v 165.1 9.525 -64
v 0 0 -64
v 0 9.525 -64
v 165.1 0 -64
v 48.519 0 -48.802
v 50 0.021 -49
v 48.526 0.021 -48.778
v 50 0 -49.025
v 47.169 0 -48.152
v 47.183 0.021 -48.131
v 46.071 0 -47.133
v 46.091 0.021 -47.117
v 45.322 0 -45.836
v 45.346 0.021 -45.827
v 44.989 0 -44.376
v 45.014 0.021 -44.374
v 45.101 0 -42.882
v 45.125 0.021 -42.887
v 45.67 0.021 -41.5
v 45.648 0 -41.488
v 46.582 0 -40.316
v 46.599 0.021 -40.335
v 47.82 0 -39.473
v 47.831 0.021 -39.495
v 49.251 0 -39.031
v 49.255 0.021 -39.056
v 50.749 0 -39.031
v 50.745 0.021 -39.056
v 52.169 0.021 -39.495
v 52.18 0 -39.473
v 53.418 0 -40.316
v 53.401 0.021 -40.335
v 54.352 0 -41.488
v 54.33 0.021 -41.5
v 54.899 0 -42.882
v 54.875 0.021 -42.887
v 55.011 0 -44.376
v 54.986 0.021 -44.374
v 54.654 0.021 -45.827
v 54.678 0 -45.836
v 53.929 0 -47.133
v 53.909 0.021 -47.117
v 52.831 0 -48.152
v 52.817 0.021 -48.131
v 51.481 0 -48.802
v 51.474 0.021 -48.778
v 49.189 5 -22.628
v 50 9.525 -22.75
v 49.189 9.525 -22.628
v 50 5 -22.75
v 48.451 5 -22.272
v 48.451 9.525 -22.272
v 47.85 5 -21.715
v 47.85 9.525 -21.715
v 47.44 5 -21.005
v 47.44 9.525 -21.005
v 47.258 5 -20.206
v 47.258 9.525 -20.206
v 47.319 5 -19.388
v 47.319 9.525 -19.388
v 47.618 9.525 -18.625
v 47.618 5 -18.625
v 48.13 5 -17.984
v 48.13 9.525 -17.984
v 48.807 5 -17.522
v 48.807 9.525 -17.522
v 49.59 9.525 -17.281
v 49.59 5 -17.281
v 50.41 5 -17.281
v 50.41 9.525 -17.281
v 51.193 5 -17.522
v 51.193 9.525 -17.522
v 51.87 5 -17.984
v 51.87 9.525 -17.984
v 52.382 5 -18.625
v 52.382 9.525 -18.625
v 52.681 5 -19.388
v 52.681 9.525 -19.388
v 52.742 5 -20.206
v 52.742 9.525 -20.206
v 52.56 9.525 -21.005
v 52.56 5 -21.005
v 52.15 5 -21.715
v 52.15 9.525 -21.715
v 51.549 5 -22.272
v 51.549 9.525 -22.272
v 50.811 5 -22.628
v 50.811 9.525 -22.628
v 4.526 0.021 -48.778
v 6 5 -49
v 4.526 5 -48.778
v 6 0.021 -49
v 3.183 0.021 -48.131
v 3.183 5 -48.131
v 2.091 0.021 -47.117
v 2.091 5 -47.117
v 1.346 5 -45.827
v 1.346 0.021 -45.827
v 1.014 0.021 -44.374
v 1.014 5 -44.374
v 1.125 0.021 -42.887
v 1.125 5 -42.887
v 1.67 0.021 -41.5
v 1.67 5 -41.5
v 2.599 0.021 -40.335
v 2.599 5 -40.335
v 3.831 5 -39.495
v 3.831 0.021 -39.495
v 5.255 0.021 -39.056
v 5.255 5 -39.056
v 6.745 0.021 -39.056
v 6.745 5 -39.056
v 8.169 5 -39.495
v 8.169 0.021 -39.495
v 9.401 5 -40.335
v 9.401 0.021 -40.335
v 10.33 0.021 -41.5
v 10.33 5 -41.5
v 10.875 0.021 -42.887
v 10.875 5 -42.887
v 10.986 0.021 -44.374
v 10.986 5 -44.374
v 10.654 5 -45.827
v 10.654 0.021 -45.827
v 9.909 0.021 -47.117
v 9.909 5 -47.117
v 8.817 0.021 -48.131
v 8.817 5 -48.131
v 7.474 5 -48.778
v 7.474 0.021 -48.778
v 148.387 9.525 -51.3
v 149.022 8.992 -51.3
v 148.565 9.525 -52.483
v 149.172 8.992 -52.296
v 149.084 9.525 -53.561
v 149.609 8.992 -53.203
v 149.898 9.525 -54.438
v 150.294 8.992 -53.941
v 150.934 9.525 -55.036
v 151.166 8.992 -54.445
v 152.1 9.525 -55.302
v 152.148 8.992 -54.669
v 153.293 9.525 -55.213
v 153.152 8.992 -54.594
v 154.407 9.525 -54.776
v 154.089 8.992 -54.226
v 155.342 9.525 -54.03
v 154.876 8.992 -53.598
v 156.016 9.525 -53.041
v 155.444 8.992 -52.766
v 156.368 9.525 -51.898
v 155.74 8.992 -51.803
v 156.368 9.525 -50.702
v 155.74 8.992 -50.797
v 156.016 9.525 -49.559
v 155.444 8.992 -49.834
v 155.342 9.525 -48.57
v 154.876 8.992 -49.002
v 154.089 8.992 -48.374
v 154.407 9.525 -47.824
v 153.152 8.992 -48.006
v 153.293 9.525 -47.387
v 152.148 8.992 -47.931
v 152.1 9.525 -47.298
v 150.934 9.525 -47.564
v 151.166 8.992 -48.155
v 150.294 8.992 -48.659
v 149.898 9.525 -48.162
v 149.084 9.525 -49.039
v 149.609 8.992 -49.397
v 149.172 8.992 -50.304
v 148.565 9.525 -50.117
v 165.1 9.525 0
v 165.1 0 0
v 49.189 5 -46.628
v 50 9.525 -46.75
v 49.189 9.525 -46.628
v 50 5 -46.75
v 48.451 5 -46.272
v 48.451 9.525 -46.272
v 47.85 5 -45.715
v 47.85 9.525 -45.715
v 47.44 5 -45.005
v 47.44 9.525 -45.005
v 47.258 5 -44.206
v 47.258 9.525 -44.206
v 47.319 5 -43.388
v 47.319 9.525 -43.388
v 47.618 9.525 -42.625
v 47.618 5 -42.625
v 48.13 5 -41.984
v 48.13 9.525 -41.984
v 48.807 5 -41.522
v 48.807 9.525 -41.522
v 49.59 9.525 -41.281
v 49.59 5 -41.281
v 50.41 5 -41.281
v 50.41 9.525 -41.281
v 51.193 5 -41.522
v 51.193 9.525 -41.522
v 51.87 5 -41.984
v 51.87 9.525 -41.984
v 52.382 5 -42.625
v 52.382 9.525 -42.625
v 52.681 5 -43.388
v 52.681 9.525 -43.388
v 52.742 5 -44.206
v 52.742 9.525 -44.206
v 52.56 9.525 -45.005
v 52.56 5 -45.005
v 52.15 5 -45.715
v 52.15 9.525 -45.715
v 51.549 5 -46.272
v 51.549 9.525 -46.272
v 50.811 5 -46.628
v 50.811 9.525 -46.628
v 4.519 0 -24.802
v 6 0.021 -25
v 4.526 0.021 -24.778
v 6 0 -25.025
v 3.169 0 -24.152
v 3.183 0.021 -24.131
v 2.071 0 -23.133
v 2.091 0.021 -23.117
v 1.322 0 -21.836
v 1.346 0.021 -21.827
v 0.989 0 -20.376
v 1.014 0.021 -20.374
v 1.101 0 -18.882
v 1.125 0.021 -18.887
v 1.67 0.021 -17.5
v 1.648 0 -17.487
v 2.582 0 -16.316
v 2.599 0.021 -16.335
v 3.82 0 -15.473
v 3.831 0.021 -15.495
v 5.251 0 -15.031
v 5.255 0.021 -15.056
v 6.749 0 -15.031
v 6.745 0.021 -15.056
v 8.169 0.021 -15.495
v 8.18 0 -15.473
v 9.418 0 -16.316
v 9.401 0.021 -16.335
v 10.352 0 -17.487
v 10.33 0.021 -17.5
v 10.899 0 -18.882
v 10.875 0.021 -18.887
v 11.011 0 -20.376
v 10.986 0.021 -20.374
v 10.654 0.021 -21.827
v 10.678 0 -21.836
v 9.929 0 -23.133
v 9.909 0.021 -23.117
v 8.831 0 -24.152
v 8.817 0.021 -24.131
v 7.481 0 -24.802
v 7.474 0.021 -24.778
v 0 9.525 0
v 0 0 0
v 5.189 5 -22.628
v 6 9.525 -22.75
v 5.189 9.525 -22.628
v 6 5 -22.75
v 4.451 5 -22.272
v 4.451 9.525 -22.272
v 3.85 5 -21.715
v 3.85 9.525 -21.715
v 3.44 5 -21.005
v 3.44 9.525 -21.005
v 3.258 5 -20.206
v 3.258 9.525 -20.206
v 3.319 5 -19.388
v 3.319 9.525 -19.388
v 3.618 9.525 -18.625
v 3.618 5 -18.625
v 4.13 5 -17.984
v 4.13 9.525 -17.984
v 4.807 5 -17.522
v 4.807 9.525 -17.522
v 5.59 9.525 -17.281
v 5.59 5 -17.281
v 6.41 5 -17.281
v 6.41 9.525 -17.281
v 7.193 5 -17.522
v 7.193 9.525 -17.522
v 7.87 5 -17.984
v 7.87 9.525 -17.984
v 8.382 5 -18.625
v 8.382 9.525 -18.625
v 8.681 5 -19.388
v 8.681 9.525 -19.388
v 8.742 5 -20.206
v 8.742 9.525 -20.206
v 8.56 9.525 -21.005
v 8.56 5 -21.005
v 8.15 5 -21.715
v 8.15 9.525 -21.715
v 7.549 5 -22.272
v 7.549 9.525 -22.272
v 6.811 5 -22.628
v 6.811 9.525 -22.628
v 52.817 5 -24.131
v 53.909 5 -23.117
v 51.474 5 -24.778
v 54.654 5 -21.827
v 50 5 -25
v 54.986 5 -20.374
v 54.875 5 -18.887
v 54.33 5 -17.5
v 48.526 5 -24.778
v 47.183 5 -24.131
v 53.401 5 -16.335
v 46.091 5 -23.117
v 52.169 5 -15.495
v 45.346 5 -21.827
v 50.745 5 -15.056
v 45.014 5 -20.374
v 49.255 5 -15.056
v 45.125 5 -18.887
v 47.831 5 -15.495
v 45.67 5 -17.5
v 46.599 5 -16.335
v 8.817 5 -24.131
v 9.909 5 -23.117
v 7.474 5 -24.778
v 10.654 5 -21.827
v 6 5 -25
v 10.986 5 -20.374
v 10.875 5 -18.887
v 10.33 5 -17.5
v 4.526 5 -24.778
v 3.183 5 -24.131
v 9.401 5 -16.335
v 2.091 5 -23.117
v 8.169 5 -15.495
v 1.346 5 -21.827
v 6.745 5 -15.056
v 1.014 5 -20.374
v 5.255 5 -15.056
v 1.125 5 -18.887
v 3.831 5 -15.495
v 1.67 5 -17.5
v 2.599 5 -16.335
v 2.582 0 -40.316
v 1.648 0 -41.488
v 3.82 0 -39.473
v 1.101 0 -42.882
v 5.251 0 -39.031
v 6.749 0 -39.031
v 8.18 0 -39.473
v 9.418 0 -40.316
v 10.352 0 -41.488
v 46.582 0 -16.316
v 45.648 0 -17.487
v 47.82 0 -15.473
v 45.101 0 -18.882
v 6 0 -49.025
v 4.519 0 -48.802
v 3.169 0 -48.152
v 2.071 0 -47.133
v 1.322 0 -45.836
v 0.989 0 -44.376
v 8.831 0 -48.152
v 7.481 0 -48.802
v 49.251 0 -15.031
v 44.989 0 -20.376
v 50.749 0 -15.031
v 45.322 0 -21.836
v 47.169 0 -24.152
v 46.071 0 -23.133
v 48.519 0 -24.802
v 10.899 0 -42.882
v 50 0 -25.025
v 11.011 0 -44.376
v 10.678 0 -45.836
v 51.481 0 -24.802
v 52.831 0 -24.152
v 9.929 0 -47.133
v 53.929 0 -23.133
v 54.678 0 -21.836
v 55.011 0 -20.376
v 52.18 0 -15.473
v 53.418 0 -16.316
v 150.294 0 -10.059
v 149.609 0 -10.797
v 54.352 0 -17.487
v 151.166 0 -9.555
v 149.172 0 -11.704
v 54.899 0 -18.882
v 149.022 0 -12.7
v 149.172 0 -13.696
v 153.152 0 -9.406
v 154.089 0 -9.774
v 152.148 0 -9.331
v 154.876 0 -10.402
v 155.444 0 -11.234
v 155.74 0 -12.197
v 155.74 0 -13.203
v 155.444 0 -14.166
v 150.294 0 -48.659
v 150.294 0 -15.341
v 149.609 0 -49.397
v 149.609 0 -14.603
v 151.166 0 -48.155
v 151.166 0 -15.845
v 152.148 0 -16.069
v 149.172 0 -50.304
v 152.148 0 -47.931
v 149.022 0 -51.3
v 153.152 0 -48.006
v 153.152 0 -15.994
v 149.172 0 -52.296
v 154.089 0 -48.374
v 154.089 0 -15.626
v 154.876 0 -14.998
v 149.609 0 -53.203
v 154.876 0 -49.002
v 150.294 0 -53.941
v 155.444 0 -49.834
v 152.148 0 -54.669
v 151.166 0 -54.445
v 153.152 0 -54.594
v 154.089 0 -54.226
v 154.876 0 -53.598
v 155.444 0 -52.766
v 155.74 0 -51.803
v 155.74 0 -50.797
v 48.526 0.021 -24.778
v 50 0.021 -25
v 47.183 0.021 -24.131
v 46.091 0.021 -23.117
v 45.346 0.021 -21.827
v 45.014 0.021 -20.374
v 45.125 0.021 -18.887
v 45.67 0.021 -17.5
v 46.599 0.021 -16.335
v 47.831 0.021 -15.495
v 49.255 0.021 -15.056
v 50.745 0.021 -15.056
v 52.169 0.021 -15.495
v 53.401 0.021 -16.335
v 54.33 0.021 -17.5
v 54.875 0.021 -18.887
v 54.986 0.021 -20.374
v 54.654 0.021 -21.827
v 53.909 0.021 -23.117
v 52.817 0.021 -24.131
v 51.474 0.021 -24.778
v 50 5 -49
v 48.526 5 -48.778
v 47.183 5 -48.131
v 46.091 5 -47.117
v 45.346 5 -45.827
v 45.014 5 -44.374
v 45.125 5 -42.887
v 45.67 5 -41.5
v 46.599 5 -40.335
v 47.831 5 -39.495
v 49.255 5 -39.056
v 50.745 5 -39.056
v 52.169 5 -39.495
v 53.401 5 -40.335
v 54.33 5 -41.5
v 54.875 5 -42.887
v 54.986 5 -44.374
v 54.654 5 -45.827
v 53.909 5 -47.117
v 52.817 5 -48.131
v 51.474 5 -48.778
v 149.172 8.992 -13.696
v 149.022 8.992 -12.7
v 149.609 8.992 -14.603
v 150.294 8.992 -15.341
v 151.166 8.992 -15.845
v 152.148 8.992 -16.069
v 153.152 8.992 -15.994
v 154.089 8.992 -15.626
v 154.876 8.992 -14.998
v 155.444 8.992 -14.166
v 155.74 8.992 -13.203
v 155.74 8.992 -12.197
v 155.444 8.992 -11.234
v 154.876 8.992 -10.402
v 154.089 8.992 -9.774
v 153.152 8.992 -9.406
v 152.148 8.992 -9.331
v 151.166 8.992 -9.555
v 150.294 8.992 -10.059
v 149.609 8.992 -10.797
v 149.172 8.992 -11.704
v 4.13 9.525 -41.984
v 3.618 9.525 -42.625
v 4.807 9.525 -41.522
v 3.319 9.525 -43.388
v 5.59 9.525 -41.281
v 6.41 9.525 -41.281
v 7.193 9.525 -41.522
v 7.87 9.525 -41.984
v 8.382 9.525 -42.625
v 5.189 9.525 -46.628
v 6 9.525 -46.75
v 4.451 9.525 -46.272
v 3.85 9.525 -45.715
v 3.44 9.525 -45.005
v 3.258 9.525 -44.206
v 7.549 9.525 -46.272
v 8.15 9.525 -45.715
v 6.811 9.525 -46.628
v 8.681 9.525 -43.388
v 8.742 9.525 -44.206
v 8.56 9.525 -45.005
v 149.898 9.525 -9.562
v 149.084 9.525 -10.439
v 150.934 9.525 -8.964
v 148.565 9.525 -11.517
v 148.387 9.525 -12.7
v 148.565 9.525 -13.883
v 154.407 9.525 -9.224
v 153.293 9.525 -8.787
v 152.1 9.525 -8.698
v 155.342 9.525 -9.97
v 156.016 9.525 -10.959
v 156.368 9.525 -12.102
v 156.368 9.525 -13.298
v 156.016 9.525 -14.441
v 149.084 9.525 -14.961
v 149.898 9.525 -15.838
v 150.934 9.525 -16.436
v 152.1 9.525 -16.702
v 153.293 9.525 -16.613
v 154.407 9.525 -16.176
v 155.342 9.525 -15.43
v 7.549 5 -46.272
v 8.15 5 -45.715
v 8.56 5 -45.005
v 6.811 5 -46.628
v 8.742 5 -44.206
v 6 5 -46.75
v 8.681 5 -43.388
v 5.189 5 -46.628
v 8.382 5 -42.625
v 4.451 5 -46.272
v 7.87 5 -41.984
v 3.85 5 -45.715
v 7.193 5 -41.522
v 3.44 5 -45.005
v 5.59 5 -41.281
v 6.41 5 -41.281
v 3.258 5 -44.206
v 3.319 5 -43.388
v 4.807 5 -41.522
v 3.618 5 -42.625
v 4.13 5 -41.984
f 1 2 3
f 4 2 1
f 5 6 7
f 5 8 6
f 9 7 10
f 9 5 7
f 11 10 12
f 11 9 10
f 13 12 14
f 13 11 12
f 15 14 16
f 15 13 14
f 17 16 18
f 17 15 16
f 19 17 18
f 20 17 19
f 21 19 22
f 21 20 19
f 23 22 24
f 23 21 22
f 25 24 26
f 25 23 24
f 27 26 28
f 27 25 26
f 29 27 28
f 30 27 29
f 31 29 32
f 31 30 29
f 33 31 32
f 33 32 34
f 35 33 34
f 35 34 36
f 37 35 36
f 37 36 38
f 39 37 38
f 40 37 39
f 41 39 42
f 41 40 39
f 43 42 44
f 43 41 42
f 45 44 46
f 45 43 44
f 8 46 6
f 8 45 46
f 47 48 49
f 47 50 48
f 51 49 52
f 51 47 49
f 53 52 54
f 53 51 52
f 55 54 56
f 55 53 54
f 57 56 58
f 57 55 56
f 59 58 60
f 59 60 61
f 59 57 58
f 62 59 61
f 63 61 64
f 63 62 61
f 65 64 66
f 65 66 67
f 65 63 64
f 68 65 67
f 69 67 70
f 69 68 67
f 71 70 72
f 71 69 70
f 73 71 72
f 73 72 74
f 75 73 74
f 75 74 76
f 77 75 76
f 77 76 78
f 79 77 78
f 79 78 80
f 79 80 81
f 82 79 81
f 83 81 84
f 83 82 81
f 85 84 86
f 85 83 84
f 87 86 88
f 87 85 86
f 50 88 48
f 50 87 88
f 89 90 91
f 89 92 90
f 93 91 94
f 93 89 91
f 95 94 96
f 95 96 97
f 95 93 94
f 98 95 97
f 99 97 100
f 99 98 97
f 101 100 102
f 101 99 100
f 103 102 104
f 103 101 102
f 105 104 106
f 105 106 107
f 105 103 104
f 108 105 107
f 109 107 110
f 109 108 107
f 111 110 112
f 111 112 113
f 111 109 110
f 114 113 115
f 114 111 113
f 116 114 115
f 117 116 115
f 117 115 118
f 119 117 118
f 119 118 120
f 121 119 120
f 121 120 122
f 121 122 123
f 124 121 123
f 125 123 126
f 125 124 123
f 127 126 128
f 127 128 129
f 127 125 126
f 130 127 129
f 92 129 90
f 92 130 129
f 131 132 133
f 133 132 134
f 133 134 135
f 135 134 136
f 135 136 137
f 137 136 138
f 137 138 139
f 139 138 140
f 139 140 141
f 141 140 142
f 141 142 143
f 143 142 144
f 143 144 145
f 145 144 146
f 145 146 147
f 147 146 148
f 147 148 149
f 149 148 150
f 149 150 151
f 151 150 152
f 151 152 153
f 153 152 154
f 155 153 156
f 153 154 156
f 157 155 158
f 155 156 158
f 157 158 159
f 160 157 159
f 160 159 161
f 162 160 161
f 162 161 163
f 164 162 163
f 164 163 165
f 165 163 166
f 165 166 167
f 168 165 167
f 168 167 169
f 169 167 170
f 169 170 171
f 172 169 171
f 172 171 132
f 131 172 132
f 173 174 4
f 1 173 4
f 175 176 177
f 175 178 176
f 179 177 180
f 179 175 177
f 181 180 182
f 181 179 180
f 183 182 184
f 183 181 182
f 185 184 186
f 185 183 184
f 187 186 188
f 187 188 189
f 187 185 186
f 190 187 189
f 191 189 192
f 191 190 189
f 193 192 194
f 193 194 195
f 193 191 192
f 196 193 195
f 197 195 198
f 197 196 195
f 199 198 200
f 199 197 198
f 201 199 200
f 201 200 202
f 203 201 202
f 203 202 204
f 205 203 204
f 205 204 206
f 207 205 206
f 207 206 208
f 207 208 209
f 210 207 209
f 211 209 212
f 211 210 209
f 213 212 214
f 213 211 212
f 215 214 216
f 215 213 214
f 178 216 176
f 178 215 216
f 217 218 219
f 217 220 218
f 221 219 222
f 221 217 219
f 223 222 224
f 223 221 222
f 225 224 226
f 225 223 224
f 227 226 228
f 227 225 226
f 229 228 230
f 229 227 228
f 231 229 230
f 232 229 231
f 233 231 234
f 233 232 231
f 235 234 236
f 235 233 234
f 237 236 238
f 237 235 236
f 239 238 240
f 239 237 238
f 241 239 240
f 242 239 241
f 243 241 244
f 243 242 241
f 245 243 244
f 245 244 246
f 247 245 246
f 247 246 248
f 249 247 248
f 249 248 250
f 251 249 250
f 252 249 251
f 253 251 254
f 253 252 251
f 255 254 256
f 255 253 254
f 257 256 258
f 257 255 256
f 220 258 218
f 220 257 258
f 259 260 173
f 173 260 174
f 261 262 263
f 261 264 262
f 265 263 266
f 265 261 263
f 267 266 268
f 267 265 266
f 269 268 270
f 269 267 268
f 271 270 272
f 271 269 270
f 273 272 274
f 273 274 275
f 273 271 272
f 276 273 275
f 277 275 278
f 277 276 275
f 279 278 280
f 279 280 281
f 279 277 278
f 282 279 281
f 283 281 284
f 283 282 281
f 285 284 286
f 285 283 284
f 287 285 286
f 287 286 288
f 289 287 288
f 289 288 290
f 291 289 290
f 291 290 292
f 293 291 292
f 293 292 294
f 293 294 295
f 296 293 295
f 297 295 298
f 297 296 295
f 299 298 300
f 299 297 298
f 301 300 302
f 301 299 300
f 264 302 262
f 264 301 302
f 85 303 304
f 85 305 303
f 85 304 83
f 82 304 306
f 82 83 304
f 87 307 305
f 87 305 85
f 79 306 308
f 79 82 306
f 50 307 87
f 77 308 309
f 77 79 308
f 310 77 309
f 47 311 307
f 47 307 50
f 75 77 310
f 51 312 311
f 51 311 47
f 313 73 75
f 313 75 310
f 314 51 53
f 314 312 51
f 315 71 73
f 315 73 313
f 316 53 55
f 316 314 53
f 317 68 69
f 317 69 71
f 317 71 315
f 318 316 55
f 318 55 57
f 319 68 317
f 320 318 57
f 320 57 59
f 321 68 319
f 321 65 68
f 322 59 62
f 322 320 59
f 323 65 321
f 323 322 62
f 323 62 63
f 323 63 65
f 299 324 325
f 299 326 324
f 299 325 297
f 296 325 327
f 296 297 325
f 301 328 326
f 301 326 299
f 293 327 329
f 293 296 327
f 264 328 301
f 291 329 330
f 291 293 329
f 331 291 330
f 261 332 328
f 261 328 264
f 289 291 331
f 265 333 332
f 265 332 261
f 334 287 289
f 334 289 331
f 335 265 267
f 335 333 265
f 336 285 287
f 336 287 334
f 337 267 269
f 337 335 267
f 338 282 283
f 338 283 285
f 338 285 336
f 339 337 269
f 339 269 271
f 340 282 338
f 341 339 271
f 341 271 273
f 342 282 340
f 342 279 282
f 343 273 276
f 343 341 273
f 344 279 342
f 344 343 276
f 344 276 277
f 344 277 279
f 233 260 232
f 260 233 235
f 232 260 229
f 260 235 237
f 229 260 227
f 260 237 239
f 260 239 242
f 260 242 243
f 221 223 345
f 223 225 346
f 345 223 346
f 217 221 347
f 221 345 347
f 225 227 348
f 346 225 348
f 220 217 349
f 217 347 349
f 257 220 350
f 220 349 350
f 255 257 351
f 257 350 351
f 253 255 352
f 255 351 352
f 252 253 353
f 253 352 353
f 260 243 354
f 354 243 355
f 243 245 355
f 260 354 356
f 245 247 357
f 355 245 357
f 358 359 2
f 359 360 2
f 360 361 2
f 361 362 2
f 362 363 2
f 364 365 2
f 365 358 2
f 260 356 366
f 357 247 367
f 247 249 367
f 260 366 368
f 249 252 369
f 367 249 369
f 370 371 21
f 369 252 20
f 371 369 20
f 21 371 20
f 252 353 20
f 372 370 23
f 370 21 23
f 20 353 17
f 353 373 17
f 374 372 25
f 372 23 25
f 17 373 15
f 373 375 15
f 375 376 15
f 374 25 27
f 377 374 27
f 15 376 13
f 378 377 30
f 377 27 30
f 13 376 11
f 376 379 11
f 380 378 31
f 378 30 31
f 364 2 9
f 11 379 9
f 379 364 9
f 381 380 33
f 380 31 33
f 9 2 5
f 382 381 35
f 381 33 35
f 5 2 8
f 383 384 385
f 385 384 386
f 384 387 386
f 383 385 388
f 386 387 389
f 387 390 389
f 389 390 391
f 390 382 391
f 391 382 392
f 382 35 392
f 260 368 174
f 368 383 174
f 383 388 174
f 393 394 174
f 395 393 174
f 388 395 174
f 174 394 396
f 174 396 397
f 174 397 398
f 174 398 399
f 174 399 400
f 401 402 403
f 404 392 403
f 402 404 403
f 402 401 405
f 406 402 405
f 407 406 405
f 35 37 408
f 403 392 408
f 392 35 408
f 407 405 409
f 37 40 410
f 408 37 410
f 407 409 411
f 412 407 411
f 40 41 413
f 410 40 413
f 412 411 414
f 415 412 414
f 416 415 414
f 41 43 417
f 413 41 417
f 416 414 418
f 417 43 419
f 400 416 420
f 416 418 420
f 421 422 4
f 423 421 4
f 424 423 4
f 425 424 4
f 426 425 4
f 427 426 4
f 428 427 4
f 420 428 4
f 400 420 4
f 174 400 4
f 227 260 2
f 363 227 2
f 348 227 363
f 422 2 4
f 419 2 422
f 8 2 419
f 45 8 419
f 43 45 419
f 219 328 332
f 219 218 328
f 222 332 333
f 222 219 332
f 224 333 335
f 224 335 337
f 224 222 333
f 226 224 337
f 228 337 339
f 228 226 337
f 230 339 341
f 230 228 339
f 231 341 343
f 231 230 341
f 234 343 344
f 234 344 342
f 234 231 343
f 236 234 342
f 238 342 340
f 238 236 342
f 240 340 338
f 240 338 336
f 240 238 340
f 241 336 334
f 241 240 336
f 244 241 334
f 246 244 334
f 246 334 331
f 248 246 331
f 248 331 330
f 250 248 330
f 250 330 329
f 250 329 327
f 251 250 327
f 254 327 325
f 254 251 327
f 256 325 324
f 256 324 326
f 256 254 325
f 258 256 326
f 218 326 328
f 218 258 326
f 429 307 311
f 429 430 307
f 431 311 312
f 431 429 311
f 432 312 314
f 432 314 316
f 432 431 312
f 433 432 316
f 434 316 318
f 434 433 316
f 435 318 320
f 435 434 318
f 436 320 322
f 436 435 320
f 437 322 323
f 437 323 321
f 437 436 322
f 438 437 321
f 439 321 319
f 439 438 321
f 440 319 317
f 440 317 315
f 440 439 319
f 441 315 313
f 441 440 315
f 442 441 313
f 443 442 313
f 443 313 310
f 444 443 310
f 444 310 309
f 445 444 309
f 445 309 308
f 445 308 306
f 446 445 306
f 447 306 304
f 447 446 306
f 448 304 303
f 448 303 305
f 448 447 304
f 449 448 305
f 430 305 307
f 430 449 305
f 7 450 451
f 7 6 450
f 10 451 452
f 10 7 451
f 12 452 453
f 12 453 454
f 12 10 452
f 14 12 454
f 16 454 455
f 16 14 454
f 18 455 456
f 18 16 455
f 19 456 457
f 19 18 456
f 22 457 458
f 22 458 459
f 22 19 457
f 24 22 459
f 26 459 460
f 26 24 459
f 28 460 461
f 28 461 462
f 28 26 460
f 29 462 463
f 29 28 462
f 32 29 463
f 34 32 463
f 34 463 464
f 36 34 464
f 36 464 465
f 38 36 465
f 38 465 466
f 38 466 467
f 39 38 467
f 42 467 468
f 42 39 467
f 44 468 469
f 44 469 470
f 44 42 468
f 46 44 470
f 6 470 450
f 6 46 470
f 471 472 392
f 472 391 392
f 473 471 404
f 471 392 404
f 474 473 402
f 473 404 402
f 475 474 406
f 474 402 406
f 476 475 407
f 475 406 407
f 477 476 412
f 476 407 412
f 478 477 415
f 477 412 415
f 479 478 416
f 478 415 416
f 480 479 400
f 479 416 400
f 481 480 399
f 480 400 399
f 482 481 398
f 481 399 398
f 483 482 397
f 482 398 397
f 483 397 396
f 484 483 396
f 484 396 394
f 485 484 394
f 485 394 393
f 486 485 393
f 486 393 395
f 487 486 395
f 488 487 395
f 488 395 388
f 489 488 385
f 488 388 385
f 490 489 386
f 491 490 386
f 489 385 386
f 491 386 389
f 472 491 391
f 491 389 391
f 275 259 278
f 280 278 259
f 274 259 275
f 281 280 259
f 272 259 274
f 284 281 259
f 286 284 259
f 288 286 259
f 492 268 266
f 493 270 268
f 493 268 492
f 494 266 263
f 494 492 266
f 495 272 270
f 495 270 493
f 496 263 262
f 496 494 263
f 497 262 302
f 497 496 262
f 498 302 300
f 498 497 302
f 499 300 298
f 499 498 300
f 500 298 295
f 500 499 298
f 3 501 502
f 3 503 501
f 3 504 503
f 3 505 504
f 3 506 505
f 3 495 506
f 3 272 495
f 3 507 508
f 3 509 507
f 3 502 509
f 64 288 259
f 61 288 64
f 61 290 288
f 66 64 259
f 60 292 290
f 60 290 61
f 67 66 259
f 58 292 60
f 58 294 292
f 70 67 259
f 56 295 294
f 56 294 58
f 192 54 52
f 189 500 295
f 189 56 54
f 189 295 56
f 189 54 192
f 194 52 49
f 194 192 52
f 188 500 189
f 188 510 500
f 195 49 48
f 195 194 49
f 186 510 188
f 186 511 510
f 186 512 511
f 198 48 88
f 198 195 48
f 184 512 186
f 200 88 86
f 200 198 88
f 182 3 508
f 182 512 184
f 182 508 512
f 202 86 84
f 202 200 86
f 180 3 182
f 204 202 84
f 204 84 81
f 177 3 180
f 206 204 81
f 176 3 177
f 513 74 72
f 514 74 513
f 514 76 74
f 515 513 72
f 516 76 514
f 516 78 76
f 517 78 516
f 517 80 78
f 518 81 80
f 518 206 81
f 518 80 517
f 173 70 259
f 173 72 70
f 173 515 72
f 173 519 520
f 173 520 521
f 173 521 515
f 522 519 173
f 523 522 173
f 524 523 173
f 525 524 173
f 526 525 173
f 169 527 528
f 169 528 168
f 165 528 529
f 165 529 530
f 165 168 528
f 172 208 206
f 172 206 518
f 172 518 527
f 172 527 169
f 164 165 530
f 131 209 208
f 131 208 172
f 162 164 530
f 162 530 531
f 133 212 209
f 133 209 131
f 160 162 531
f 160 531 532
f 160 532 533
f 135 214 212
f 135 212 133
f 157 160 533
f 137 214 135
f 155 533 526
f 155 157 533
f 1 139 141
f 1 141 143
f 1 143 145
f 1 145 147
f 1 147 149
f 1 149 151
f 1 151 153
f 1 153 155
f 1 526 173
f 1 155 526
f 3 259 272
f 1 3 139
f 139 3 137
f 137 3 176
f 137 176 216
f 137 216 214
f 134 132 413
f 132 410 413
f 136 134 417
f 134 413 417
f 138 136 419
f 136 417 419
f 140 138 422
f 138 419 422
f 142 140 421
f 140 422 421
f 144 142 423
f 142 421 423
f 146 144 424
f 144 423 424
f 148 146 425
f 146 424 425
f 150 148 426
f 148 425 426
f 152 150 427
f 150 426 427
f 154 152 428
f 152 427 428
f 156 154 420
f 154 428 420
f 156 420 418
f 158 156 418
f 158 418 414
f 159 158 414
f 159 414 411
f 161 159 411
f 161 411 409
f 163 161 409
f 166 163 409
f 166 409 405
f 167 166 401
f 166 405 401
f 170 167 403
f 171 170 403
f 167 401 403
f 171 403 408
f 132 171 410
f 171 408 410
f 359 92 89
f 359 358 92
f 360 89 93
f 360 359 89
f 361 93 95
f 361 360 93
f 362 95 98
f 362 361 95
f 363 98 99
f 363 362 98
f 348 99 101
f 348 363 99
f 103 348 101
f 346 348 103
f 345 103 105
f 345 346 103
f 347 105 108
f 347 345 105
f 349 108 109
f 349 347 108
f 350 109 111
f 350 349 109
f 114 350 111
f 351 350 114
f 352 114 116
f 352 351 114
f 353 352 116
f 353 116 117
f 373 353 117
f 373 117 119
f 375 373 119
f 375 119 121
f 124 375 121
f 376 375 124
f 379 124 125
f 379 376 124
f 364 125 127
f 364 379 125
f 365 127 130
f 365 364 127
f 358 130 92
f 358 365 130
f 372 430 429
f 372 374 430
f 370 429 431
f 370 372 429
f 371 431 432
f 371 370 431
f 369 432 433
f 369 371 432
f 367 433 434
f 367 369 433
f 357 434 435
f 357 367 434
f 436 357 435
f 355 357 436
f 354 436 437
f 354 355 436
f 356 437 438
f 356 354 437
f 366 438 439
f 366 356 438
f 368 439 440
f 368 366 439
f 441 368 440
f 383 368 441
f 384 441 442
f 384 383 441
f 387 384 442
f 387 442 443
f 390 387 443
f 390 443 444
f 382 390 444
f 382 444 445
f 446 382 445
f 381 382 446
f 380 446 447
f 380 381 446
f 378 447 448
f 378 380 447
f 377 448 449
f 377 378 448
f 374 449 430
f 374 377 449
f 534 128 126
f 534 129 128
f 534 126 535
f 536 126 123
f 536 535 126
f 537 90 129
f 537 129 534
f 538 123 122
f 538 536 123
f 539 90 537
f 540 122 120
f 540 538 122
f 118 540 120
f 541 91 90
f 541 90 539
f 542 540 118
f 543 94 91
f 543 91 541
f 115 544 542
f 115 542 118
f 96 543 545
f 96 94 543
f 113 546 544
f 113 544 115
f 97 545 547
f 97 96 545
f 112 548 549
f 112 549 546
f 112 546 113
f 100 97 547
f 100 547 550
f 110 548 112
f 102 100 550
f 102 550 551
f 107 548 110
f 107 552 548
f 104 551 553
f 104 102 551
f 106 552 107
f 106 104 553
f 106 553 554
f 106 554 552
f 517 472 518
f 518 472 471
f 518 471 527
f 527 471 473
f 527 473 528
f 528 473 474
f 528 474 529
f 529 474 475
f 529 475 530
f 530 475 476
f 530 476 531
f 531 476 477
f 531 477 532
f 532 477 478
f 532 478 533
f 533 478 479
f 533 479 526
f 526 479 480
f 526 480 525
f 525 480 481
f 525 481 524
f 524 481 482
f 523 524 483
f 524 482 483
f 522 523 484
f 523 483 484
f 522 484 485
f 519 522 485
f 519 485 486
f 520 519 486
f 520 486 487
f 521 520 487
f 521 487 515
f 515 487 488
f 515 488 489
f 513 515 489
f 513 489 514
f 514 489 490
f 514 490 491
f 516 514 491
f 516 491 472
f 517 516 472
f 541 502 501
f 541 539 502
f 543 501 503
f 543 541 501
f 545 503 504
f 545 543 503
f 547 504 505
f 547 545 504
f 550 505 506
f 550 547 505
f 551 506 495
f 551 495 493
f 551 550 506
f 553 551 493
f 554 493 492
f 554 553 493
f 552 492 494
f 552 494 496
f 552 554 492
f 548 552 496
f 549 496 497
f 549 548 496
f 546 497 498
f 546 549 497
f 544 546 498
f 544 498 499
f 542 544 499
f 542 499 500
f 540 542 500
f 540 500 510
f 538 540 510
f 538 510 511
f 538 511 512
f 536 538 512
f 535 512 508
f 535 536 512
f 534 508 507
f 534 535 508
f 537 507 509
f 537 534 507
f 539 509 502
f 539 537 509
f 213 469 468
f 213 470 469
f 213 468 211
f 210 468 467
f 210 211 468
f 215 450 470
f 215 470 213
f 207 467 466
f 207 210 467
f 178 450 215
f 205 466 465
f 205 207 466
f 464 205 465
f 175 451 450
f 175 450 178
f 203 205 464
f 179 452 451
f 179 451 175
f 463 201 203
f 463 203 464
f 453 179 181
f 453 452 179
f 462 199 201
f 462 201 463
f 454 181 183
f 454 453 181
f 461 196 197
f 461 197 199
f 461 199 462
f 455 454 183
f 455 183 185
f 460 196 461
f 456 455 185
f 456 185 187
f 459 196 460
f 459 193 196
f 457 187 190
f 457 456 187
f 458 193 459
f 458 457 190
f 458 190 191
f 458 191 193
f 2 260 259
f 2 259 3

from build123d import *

# Parameters (mm, degrees)
SKETCH1_W                         = 165.1
SKETCH1_H                         = 64
BOSS_EXTRUDE1_DEPTH               = 9.525
F_1_4_CLEARANCE_HOLE1_D           = 6.7564
F_1_4_CLEARANCE_HOLE1_CSINK_D     = 8.0264
F_1_4_CLEARANCE_HOLE1_CSINK_ANGLE = 100
CBORE_FOR_M5_SHCS1_AT_2_COUNT     = 2
CBORE_FOR_M5_SHCS1_AT_2_PITCH     = 44
CBORE_FOR_M5_SHCS1_AT_3_COUNT     = 2
CBORE_FOR_M5_SHCS1_AT_3_PITCH     = 50.119856345
CBORE_FOR_M5_SHCS1_AT_4_COUNT     = 2
CBORE_FOR_M5_SHCS1_AT_4_PITCH     = 24


with BuildPart() as part:
    # Sketch1 → Boss-Extrude1 (new body)
    with BuildSketch(Plane(origin=(0, 0, 0), x_dir=(1, 0, 0), z_dir=(0, 1, 0))):
        with Locations((82.55, 32)):
            Rectangle(SKETCH1_W, SKETCH1_H)
    extrude(amount=BOSS_EXTRUDE1_DEPTH)

    # 1/4 Clearance Hole1 (through all)
    with Locations(Plane(origin=(0, 9.525, 0), x_dir=(1, 0, 0), z_dir=(0, 1, 0))):
        with Locations((152.4, 51.3), (152.4, 12.7)):
            CounterSinkHole(F_1_4_CLEARANCE_HOLE1_D / 2, F_1_4_CLEARANCE_HOLE1_CSINK_D / 2, counter_sink_angle=F_1_4_CLEARANCE_HOLE1_CSINK_ANGLE)

    # Sketch7 → CBORE for M5 SHCS1 (revolve, cut)
    with BuildSketch(Plane(origin=(6, 0, -44), x_dir=(0, 0, -1), z_dir=(1, 0, 0))):
        Polygon((0, 0), (0, 9.525), (2.75, 9.525), (2.75, 5), (5, 5), (5, 0.020977491), (5.025, 0), align=None)
    cbore_for_m5_shcs1 = revolve(axis=Axis((6, -6.35, -44), (0, 1, 0)), mode=Mode.SUBTRACT)

    # CBORE for M5 SHCS1 at 2: CBORE for M5 SHCS1 ×2
    with Locations(*[(i * CBORE_FOR_M5_SHCS1_AT_2_PITCH, 0, 0) for i in range(1, CBORE_FOR_M5_SHCS1_AT_2_COUNT)]):
        add(cbore_for_m5_shcs1, mode=Mode.SUBTRACT)

    # CBORE for M5 SHCS1 at 3: CBORE for M5 SHCS1 ×2
    with Locations(*[Vector(0.8778955729143844, 0, 0.4788521306805733) * (i * CBORE_FOR_M5_SHCS1_AT_3_PITCH) for i in range(1, CBORE_FOR_M5_SHCS1_AT_3_COUNT)]):
        add(cbore_for_m5_shcs1, mode=Mode.SUBTRACT)

    # CBORE for M5 SHCS1 at 4: CBORE for M5 SHCS1 ×2
    with Locations(*[(0, 0, i * CBORE_FOR_M5_SHCS1_AT_4_PITCH) for i in range(1, CBORE_FOR_M5_SHCS1_AT_4_COUNT)]):
        add(cbore_for_m5_shcs1, mode=Mode.SUBTRACT)


solid = part.part
